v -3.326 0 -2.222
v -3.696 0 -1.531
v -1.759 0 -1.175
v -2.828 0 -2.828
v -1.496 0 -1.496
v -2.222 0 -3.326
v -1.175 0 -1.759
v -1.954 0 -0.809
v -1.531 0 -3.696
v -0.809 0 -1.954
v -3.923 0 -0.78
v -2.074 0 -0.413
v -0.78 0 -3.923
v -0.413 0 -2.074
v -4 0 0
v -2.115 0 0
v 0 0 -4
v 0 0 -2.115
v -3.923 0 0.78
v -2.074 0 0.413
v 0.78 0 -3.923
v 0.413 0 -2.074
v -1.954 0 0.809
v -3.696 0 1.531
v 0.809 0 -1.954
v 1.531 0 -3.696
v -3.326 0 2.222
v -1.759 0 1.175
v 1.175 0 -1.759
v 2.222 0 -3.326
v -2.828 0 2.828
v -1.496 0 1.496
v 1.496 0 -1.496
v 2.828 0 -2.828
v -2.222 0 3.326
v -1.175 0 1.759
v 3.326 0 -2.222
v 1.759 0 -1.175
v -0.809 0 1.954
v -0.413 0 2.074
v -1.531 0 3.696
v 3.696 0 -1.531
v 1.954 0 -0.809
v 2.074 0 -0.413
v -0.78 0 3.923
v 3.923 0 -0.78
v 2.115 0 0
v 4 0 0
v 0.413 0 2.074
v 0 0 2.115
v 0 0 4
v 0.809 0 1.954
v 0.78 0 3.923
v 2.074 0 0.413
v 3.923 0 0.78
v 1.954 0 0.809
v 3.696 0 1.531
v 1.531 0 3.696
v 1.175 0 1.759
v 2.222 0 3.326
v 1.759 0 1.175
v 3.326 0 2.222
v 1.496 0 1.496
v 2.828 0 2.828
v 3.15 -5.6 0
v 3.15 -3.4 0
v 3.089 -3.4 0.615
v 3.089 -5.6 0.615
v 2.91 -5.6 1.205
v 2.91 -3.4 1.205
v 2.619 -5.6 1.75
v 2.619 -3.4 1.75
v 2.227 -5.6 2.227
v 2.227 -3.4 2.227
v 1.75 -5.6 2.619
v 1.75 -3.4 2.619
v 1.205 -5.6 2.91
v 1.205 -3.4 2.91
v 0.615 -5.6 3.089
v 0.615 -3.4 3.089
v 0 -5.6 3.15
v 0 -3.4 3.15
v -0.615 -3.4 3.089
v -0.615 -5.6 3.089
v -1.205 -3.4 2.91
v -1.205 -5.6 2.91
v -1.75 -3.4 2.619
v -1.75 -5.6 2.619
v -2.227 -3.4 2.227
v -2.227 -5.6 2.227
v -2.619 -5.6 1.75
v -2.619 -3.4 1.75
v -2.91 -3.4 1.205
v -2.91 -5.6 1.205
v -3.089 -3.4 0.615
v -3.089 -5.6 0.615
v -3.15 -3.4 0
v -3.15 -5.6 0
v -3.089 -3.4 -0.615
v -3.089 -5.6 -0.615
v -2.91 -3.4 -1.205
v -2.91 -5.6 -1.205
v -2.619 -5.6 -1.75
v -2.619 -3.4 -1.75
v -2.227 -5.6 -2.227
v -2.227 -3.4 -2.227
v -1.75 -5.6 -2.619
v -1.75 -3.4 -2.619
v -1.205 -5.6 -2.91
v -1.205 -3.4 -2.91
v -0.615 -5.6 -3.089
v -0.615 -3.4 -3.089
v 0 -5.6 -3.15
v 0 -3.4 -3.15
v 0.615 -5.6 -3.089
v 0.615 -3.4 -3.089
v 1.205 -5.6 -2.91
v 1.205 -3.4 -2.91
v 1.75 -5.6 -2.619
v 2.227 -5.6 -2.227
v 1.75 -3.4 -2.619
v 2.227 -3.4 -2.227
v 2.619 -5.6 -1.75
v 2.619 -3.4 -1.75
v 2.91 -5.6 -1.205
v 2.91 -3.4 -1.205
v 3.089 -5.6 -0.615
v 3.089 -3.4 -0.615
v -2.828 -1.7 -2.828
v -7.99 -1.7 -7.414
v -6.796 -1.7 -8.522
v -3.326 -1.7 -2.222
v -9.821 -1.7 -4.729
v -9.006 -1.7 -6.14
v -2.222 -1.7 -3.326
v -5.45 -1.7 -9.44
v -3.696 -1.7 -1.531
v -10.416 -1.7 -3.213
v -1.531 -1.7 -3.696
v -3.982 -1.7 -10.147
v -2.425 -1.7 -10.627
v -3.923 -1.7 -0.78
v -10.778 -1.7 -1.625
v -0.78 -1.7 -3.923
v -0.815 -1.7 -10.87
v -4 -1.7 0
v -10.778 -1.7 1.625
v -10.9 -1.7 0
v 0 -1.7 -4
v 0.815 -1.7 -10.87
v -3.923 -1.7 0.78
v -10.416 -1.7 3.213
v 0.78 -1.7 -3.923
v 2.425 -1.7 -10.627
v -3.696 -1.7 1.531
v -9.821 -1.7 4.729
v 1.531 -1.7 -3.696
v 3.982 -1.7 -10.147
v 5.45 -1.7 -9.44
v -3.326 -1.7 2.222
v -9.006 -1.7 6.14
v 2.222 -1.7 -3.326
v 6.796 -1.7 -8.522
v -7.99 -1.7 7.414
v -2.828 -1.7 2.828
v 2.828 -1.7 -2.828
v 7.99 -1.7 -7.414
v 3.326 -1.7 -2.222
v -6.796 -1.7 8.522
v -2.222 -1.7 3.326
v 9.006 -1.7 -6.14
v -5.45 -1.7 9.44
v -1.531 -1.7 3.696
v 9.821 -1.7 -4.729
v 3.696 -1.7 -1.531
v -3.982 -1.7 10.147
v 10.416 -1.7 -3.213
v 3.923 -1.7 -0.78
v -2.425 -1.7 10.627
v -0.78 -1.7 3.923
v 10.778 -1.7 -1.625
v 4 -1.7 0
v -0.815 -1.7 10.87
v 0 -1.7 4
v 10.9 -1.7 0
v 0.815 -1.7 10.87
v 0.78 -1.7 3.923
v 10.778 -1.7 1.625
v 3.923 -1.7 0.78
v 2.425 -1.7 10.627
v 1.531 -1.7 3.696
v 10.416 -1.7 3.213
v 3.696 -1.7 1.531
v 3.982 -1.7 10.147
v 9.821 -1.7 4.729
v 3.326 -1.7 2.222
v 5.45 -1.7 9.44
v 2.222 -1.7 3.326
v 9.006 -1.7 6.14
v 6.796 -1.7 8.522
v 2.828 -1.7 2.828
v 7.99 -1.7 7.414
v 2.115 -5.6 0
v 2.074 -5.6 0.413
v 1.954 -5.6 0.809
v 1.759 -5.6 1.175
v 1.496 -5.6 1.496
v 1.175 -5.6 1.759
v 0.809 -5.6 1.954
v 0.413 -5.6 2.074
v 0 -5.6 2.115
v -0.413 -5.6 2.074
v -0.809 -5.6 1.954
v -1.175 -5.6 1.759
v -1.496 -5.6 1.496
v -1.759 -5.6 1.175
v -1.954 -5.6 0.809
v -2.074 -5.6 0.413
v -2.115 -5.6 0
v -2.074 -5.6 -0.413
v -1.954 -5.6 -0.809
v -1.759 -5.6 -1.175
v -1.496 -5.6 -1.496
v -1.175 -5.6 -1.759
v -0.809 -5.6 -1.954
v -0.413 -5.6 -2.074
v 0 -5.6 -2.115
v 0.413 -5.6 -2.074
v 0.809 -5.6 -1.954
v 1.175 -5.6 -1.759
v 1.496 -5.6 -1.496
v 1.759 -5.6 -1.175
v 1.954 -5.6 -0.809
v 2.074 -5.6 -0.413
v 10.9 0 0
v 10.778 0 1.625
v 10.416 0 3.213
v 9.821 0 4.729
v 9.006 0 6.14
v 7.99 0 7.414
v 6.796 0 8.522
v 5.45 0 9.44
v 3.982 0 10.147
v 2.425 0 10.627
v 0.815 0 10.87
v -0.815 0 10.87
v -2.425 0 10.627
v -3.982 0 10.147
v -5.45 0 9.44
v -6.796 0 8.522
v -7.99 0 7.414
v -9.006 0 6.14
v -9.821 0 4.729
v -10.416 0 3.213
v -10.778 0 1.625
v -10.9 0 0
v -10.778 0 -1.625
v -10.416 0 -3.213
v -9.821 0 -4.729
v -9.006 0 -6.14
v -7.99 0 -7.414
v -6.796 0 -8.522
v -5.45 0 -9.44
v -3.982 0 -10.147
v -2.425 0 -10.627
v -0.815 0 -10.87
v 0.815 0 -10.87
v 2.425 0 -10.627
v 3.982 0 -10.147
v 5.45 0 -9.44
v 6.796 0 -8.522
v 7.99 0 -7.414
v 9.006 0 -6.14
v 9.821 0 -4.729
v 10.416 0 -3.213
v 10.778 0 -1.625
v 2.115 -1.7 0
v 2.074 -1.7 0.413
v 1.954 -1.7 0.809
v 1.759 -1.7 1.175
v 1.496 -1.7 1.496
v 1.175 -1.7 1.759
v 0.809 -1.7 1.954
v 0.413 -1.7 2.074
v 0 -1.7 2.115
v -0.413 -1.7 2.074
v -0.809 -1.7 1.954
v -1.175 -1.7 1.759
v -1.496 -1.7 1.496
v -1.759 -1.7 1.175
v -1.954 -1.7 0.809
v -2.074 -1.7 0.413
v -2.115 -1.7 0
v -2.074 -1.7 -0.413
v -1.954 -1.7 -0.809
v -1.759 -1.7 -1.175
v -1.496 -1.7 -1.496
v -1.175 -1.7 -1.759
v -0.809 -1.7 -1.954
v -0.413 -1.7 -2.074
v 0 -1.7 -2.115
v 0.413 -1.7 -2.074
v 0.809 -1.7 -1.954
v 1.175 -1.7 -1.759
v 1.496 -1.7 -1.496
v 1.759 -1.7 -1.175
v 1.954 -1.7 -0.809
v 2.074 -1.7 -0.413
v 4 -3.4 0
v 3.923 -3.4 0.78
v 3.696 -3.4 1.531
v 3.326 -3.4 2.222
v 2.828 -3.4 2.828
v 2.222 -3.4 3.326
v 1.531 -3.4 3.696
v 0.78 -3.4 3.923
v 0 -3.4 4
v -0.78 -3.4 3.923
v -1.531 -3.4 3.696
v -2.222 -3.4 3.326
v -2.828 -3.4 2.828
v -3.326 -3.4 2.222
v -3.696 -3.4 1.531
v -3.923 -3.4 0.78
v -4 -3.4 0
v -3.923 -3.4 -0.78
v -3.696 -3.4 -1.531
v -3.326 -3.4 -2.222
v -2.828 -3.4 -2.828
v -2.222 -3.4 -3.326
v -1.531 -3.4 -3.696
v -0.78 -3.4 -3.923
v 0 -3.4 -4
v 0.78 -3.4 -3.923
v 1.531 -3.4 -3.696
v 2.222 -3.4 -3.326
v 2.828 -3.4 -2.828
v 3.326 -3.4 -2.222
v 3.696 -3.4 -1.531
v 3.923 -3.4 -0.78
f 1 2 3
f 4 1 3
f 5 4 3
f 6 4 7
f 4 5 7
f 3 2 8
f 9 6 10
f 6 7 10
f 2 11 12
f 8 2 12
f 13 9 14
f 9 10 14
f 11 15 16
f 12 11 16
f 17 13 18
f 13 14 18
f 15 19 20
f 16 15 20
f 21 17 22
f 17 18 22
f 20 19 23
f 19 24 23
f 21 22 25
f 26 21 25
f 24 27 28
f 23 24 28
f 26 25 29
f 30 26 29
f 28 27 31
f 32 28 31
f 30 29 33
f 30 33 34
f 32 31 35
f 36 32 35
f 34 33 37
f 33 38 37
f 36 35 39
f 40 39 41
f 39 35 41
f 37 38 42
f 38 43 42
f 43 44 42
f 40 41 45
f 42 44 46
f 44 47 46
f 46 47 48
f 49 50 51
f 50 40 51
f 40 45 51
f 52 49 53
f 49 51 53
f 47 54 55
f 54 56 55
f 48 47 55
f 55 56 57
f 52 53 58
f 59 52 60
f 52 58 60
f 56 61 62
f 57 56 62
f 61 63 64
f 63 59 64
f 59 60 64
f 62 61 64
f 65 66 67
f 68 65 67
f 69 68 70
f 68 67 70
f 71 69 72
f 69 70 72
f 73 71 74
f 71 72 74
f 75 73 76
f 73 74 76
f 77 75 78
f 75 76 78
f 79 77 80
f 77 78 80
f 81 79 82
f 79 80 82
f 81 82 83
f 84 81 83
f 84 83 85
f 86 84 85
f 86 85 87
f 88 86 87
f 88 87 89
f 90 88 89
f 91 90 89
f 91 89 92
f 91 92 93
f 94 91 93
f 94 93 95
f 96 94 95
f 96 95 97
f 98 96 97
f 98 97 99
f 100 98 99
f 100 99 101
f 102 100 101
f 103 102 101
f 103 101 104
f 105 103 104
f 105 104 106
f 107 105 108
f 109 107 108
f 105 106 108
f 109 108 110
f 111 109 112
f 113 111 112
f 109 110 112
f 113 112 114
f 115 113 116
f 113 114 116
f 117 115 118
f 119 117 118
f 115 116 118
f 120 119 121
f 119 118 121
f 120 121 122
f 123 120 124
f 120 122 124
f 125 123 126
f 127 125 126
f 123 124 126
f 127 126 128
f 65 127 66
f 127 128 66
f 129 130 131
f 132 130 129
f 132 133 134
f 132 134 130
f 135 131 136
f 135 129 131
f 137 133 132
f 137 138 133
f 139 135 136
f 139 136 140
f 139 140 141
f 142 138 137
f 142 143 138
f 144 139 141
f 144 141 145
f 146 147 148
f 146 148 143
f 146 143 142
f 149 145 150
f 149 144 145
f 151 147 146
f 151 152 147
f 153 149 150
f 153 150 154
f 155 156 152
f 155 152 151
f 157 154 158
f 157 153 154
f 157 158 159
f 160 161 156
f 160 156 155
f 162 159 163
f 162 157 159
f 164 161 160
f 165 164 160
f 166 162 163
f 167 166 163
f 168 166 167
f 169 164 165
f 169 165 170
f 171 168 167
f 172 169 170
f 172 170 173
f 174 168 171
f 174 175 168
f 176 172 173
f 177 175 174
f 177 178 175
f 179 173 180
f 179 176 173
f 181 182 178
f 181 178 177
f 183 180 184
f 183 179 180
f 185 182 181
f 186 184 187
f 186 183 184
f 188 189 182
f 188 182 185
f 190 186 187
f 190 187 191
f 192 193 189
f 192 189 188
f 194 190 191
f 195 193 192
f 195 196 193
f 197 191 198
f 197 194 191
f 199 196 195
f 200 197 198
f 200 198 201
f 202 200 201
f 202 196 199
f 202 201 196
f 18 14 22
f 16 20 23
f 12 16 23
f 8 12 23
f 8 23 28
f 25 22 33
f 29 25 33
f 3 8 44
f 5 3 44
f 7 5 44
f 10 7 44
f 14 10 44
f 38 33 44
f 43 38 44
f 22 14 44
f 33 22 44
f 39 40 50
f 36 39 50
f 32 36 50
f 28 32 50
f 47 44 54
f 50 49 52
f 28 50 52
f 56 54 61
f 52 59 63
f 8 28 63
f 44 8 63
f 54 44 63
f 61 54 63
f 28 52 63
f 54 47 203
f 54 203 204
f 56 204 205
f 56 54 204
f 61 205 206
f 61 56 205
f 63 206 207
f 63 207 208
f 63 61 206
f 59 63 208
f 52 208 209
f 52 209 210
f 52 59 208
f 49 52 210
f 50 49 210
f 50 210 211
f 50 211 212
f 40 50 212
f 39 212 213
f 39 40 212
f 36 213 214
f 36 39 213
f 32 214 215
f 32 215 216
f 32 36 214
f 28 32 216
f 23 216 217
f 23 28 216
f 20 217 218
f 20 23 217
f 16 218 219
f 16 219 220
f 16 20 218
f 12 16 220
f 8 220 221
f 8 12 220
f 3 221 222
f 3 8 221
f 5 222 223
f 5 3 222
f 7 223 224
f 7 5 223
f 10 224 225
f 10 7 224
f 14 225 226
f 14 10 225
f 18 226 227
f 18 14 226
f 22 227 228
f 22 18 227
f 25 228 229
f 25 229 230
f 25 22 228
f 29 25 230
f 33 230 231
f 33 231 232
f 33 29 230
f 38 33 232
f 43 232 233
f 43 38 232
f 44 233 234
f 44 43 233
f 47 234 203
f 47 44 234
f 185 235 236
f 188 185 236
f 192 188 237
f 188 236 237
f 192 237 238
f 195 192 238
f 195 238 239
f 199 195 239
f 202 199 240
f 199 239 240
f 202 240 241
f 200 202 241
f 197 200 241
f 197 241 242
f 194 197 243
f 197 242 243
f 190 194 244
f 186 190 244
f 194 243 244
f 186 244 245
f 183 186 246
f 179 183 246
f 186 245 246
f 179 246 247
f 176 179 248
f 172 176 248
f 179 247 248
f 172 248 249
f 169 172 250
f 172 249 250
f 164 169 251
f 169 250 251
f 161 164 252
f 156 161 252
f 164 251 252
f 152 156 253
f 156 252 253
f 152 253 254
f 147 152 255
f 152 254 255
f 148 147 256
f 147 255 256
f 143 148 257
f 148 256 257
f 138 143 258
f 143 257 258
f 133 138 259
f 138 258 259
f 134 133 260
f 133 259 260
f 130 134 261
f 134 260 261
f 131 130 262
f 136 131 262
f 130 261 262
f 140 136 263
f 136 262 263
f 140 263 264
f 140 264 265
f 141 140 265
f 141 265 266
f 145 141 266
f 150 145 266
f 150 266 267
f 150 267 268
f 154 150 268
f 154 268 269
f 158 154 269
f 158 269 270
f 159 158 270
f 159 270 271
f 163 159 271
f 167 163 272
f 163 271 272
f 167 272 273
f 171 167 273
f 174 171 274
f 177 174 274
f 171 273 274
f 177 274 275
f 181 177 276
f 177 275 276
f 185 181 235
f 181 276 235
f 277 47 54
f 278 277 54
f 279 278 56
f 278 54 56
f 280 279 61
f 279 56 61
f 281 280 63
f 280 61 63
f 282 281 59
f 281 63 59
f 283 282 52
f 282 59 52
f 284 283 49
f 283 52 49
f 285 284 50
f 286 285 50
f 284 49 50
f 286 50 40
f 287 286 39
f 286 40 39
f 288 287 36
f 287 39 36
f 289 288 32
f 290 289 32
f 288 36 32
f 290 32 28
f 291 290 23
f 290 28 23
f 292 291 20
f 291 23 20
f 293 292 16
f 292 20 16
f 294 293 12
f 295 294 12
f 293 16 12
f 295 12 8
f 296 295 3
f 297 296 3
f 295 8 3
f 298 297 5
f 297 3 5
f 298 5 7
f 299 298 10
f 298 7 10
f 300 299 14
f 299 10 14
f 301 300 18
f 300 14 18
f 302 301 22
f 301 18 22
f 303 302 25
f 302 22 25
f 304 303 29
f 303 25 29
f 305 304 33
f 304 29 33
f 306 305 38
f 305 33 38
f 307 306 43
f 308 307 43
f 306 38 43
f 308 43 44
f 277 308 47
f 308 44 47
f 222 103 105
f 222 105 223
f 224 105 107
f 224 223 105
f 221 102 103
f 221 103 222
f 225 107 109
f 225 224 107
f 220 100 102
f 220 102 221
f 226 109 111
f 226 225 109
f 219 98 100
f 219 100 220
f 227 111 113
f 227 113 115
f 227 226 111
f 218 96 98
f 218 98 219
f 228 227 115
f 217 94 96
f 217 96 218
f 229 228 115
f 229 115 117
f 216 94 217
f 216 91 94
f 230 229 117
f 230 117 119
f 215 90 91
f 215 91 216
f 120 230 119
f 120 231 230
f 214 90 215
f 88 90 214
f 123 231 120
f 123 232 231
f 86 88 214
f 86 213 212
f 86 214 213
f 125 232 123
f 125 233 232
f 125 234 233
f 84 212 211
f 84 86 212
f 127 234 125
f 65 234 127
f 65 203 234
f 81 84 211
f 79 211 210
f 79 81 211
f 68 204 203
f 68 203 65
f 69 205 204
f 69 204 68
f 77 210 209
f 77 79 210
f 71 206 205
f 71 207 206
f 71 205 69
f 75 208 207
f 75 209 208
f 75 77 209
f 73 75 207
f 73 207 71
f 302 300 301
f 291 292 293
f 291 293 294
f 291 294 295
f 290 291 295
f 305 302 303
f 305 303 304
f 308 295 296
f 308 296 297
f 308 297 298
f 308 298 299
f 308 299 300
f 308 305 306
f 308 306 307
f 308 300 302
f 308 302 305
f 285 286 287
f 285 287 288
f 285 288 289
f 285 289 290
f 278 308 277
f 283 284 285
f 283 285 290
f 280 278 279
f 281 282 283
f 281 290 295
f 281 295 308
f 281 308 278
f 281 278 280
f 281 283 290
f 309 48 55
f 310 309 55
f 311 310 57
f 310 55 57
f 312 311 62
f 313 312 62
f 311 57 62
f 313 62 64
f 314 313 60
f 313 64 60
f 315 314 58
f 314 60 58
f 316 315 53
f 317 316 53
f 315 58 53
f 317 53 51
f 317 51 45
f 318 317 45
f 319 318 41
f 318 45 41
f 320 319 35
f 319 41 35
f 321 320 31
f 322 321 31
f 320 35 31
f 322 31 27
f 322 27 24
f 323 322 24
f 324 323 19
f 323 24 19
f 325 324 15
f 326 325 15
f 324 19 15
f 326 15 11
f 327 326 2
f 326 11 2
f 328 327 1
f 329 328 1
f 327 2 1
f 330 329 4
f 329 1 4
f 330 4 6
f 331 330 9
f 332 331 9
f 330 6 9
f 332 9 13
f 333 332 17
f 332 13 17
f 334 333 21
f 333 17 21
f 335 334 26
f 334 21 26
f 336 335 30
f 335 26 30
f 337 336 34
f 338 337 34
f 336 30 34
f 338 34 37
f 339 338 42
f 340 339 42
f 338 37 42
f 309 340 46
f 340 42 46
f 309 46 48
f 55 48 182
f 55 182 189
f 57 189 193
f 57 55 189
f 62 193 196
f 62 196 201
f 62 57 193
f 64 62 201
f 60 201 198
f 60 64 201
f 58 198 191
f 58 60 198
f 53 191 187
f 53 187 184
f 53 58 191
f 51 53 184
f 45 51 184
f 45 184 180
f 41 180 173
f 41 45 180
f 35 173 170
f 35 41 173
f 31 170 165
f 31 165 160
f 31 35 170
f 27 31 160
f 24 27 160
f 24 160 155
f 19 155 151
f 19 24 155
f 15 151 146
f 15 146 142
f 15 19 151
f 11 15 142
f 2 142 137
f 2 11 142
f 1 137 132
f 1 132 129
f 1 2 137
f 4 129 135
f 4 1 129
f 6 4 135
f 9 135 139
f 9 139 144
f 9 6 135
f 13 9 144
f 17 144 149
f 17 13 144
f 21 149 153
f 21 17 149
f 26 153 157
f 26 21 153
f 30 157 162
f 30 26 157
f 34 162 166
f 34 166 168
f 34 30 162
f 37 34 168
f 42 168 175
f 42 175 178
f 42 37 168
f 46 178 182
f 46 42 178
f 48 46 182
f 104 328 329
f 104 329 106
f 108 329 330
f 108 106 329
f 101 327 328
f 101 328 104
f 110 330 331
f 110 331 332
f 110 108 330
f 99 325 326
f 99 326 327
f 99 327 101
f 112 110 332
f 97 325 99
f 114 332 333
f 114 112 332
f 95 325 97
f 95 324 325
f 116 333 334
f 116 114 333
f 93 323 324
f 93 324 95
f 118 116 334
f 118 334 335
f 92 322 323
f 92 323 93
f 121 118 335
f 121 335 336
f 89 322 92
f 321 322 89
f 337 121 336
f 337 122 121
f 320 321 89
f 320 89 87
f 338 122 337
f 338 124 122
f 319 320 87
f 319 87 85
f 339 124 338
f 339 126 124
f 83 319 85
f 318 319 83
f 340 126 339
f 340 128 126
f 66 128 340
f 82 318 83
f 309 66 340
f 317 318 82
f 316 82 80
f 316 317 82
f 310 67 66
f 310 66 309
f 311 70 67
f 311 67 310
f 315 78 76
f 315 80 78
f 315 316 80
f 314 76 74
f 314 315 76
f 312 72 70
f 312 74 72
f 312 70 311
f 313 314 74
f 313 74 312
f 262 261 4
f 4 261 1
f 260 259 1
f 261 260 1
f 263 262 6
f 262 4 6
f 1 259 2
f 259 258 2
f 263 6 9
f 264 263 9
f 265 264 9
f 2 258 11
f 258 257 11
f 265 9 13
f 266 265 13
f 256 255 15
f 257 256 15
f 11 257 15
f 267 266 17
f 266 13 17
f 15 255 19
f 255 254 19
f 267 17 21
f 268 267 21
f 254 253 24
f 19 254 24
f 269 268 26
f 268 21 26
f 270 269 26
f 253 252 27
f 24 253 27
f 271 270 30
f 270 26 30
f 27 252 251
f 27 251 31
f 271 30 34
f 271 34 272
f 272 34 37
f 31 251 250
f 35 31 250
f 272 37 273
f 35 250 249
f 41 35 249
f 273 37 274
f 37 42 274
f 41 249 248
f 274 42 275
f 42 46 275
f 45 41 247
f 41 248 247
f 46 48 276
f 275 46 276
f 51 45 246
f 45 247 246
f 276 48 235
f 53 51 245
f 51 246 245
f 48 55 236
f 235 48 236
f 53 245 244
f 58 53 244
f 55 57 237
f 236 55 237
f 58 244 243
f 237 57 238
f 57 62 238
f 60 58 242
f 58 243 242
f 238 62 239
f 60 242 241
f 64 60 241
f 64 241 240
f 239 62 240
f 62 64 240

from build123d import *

# Parameters (mm, degrees)
F0_R     = 10.9
F0_R_2   = 4
F1_DEPTH = 1.7
F0_R_3   = 2.115
F0_R_4   = 3.15
F2_DEPTH = 3.4
F3_DEPTH = 5.6


with BuildPart() as f1:
    # F0 (on Front) → F1 (new body)
    with BuildSketch(Plane.XZ):
        Circle(F0_R)
        Circle(F0_R_2, mode=Mode.SUBTRACT)
    extrude(amount=F1_DEPTH)


with BuildPart() as f1b:
    # F0 (on Front) → F1, piece 2 (new body)
    with BuildSketch(Plane.XZ):
        Circle(F0_R_3)
    extrude(amount=F1_DEPTH)


with BuildPart() as f2:
    # F0 (on Front) → F2 (new body)
    with BuildSketch(Plane.XZ):
        Circle(F0_R_2)
        Circle(F0_R_4, mode=Mode.SUBTRACT)
    extrude(amount=F2_DEPTH)

    # F0 (on Front) → F3 (join)
    with BuildSketch(Plane.XZ):
        Circle(F0_R_4)
        Circle(F0_R_3, mode=Mode.SUBTRACT)
    extrude(amount=F3_DEPTH)


solid = Compound([f1.part, f1b.part, f2.part])
